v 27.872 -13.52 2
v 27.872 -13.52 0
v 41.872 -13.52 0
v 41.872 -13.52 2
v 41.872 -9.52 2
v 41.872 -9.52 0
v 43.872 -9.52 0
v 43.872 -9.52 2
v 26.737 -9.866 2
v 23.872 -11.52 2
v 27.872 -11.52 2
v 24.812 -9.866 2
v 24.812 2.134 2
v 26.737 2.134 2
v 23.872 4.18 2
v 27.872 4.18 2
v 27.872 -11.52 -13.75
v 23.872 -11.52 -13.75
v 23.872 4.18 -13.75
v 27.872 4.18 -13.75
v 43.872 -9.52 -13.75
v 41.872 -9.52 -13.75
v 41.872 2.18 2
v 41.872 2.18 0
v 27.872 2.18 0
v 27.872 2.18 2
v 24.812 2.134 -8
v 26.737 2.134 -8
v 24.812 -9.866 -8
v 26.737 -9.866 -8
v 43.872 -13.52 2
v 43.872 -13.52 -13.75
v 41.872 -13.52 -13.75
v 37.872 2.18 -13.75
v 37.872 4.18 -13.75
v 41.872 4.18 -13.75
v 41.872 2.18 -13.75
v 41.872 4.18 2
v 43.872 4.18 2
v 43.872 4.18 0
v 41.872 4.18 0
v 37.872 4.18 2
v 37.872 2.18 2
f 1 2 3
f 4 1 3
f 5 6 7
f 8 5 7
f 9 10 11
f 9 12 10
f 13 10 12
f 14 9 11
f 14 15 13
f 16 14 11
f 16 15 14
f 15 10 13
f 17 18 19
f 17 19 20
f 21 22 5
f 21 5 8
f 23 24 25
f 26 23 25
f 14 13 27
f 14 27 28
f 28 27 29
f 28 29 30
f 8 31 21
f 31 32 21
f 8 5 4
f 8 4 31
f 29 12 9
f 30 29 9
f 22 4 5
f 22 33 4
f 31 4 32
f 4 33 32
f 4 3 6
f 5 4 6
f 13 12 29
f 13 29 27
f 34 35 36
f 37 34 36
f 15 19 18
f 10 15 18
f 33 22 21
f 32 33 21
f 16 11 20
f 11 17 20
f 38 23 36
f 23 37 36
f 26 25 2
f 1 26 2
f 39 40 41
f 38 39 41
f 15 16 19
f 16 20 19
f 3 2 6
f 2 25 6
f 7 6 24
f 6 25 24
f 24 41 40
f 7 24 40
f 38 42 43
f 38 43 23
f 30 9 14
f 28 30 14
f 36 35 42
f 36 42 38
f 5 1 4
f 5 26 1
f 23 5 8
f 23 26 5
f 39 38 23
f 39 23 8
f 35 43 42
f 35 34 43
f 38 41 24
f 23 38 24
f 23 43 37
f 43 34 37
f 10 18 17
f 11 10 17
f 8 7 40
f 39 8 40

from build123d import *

# Parameters (mm, degrees)
F0_W          = 2
F0_H          = 4
F1_DEPTH      = 13.75
F1_DEPTH_BACK = 2
F2_DEPTH      = 2
F0_W_2        = 4
F0_H_2        = 2
F3_DEPTH      = 13.75
F3_DEPTH_BACK = 2
F4_DEPTH      = 13.75
F4_DEPTH_BACK = 2
F5_W          = 1.9253734684
F5_H          = 12
F6_DEPTH      = 10


with BuildPart() as f1:
    # F0 (on Top) → F1 (new body, two sides)
    with BuildSketch(Plane.XY) as f1_sk:
        with Locations((42.8717488647, -11.5202588253)):
            Rectangle(F0_W, F0_H)
    extrude(amount=-F1_DEPTH)
    extrude(f1_sk.sketch, amount=F1_DEPTH_BACK)


with BuildPart() as f2:
    # F0 (on Top) → F2 (new body)
    with BuildSketch(Plane.XY):
        Polygon((27.8717488647, -13.5202588253), (41.8717488647, -13.5202588253), (41.8717488647, -9.5202588253), (43.8717488647, -9.5202588253), (43.8717488647, 4.1797411747), (41.8717488647, 4.1797411747), (41.8717488647, 2.1797411747), (37.8717488647, 2.1797411747), (27.8717488647, 2.1797411747), (27.8717488647, -11.5202588253), align=None)
    extrude(amount=F2_DEPTH)


with BuildPart() as f3:
    # F0 (on Top) → F3 (new body, two sides)
    with BuildSketch(Plane.XY) as f3_sk:
        with Locations((39.8717488647, 3.1797411747)):
            Rectangle(F0_W_2, F0_H_2)
    extrude(amount=-F3_DEPTH)
    extrude(f3_sk.sketch, amount=F3_DEPTH_BACK)


with BuildPart() as f4:
    # F0 (on Top) → F4 (new body, two sides)
    with BuildSketch(Plane.XY) as f4_sk:
        Polygon((23.8717488647, -11.5202588253), (27.8717488647, -11.5202588253), (27.8717488647, 2.1797411747), (27.8717488647, 4.1797411747), (23.8717488647, 4.1797411747), align=None)
    extrude(amount=-F4_DEPTH)
    extrude(f4_sk.sketch, amount=F4_DEPTH_BACK)

    # F5 (on face) → F6 (cut)
    with BuildSketch(Plane.XY.offset(2)):
        with Locations((25.7747555152, -3.8655172102)):
            Rectangle(F5_W, F5_H)
    extrude(amount=-F6_DEPTH, mode=Mode.SUBTRACT)


solid = Compound([f1.part, f2.part, f3.part, f4.part])
